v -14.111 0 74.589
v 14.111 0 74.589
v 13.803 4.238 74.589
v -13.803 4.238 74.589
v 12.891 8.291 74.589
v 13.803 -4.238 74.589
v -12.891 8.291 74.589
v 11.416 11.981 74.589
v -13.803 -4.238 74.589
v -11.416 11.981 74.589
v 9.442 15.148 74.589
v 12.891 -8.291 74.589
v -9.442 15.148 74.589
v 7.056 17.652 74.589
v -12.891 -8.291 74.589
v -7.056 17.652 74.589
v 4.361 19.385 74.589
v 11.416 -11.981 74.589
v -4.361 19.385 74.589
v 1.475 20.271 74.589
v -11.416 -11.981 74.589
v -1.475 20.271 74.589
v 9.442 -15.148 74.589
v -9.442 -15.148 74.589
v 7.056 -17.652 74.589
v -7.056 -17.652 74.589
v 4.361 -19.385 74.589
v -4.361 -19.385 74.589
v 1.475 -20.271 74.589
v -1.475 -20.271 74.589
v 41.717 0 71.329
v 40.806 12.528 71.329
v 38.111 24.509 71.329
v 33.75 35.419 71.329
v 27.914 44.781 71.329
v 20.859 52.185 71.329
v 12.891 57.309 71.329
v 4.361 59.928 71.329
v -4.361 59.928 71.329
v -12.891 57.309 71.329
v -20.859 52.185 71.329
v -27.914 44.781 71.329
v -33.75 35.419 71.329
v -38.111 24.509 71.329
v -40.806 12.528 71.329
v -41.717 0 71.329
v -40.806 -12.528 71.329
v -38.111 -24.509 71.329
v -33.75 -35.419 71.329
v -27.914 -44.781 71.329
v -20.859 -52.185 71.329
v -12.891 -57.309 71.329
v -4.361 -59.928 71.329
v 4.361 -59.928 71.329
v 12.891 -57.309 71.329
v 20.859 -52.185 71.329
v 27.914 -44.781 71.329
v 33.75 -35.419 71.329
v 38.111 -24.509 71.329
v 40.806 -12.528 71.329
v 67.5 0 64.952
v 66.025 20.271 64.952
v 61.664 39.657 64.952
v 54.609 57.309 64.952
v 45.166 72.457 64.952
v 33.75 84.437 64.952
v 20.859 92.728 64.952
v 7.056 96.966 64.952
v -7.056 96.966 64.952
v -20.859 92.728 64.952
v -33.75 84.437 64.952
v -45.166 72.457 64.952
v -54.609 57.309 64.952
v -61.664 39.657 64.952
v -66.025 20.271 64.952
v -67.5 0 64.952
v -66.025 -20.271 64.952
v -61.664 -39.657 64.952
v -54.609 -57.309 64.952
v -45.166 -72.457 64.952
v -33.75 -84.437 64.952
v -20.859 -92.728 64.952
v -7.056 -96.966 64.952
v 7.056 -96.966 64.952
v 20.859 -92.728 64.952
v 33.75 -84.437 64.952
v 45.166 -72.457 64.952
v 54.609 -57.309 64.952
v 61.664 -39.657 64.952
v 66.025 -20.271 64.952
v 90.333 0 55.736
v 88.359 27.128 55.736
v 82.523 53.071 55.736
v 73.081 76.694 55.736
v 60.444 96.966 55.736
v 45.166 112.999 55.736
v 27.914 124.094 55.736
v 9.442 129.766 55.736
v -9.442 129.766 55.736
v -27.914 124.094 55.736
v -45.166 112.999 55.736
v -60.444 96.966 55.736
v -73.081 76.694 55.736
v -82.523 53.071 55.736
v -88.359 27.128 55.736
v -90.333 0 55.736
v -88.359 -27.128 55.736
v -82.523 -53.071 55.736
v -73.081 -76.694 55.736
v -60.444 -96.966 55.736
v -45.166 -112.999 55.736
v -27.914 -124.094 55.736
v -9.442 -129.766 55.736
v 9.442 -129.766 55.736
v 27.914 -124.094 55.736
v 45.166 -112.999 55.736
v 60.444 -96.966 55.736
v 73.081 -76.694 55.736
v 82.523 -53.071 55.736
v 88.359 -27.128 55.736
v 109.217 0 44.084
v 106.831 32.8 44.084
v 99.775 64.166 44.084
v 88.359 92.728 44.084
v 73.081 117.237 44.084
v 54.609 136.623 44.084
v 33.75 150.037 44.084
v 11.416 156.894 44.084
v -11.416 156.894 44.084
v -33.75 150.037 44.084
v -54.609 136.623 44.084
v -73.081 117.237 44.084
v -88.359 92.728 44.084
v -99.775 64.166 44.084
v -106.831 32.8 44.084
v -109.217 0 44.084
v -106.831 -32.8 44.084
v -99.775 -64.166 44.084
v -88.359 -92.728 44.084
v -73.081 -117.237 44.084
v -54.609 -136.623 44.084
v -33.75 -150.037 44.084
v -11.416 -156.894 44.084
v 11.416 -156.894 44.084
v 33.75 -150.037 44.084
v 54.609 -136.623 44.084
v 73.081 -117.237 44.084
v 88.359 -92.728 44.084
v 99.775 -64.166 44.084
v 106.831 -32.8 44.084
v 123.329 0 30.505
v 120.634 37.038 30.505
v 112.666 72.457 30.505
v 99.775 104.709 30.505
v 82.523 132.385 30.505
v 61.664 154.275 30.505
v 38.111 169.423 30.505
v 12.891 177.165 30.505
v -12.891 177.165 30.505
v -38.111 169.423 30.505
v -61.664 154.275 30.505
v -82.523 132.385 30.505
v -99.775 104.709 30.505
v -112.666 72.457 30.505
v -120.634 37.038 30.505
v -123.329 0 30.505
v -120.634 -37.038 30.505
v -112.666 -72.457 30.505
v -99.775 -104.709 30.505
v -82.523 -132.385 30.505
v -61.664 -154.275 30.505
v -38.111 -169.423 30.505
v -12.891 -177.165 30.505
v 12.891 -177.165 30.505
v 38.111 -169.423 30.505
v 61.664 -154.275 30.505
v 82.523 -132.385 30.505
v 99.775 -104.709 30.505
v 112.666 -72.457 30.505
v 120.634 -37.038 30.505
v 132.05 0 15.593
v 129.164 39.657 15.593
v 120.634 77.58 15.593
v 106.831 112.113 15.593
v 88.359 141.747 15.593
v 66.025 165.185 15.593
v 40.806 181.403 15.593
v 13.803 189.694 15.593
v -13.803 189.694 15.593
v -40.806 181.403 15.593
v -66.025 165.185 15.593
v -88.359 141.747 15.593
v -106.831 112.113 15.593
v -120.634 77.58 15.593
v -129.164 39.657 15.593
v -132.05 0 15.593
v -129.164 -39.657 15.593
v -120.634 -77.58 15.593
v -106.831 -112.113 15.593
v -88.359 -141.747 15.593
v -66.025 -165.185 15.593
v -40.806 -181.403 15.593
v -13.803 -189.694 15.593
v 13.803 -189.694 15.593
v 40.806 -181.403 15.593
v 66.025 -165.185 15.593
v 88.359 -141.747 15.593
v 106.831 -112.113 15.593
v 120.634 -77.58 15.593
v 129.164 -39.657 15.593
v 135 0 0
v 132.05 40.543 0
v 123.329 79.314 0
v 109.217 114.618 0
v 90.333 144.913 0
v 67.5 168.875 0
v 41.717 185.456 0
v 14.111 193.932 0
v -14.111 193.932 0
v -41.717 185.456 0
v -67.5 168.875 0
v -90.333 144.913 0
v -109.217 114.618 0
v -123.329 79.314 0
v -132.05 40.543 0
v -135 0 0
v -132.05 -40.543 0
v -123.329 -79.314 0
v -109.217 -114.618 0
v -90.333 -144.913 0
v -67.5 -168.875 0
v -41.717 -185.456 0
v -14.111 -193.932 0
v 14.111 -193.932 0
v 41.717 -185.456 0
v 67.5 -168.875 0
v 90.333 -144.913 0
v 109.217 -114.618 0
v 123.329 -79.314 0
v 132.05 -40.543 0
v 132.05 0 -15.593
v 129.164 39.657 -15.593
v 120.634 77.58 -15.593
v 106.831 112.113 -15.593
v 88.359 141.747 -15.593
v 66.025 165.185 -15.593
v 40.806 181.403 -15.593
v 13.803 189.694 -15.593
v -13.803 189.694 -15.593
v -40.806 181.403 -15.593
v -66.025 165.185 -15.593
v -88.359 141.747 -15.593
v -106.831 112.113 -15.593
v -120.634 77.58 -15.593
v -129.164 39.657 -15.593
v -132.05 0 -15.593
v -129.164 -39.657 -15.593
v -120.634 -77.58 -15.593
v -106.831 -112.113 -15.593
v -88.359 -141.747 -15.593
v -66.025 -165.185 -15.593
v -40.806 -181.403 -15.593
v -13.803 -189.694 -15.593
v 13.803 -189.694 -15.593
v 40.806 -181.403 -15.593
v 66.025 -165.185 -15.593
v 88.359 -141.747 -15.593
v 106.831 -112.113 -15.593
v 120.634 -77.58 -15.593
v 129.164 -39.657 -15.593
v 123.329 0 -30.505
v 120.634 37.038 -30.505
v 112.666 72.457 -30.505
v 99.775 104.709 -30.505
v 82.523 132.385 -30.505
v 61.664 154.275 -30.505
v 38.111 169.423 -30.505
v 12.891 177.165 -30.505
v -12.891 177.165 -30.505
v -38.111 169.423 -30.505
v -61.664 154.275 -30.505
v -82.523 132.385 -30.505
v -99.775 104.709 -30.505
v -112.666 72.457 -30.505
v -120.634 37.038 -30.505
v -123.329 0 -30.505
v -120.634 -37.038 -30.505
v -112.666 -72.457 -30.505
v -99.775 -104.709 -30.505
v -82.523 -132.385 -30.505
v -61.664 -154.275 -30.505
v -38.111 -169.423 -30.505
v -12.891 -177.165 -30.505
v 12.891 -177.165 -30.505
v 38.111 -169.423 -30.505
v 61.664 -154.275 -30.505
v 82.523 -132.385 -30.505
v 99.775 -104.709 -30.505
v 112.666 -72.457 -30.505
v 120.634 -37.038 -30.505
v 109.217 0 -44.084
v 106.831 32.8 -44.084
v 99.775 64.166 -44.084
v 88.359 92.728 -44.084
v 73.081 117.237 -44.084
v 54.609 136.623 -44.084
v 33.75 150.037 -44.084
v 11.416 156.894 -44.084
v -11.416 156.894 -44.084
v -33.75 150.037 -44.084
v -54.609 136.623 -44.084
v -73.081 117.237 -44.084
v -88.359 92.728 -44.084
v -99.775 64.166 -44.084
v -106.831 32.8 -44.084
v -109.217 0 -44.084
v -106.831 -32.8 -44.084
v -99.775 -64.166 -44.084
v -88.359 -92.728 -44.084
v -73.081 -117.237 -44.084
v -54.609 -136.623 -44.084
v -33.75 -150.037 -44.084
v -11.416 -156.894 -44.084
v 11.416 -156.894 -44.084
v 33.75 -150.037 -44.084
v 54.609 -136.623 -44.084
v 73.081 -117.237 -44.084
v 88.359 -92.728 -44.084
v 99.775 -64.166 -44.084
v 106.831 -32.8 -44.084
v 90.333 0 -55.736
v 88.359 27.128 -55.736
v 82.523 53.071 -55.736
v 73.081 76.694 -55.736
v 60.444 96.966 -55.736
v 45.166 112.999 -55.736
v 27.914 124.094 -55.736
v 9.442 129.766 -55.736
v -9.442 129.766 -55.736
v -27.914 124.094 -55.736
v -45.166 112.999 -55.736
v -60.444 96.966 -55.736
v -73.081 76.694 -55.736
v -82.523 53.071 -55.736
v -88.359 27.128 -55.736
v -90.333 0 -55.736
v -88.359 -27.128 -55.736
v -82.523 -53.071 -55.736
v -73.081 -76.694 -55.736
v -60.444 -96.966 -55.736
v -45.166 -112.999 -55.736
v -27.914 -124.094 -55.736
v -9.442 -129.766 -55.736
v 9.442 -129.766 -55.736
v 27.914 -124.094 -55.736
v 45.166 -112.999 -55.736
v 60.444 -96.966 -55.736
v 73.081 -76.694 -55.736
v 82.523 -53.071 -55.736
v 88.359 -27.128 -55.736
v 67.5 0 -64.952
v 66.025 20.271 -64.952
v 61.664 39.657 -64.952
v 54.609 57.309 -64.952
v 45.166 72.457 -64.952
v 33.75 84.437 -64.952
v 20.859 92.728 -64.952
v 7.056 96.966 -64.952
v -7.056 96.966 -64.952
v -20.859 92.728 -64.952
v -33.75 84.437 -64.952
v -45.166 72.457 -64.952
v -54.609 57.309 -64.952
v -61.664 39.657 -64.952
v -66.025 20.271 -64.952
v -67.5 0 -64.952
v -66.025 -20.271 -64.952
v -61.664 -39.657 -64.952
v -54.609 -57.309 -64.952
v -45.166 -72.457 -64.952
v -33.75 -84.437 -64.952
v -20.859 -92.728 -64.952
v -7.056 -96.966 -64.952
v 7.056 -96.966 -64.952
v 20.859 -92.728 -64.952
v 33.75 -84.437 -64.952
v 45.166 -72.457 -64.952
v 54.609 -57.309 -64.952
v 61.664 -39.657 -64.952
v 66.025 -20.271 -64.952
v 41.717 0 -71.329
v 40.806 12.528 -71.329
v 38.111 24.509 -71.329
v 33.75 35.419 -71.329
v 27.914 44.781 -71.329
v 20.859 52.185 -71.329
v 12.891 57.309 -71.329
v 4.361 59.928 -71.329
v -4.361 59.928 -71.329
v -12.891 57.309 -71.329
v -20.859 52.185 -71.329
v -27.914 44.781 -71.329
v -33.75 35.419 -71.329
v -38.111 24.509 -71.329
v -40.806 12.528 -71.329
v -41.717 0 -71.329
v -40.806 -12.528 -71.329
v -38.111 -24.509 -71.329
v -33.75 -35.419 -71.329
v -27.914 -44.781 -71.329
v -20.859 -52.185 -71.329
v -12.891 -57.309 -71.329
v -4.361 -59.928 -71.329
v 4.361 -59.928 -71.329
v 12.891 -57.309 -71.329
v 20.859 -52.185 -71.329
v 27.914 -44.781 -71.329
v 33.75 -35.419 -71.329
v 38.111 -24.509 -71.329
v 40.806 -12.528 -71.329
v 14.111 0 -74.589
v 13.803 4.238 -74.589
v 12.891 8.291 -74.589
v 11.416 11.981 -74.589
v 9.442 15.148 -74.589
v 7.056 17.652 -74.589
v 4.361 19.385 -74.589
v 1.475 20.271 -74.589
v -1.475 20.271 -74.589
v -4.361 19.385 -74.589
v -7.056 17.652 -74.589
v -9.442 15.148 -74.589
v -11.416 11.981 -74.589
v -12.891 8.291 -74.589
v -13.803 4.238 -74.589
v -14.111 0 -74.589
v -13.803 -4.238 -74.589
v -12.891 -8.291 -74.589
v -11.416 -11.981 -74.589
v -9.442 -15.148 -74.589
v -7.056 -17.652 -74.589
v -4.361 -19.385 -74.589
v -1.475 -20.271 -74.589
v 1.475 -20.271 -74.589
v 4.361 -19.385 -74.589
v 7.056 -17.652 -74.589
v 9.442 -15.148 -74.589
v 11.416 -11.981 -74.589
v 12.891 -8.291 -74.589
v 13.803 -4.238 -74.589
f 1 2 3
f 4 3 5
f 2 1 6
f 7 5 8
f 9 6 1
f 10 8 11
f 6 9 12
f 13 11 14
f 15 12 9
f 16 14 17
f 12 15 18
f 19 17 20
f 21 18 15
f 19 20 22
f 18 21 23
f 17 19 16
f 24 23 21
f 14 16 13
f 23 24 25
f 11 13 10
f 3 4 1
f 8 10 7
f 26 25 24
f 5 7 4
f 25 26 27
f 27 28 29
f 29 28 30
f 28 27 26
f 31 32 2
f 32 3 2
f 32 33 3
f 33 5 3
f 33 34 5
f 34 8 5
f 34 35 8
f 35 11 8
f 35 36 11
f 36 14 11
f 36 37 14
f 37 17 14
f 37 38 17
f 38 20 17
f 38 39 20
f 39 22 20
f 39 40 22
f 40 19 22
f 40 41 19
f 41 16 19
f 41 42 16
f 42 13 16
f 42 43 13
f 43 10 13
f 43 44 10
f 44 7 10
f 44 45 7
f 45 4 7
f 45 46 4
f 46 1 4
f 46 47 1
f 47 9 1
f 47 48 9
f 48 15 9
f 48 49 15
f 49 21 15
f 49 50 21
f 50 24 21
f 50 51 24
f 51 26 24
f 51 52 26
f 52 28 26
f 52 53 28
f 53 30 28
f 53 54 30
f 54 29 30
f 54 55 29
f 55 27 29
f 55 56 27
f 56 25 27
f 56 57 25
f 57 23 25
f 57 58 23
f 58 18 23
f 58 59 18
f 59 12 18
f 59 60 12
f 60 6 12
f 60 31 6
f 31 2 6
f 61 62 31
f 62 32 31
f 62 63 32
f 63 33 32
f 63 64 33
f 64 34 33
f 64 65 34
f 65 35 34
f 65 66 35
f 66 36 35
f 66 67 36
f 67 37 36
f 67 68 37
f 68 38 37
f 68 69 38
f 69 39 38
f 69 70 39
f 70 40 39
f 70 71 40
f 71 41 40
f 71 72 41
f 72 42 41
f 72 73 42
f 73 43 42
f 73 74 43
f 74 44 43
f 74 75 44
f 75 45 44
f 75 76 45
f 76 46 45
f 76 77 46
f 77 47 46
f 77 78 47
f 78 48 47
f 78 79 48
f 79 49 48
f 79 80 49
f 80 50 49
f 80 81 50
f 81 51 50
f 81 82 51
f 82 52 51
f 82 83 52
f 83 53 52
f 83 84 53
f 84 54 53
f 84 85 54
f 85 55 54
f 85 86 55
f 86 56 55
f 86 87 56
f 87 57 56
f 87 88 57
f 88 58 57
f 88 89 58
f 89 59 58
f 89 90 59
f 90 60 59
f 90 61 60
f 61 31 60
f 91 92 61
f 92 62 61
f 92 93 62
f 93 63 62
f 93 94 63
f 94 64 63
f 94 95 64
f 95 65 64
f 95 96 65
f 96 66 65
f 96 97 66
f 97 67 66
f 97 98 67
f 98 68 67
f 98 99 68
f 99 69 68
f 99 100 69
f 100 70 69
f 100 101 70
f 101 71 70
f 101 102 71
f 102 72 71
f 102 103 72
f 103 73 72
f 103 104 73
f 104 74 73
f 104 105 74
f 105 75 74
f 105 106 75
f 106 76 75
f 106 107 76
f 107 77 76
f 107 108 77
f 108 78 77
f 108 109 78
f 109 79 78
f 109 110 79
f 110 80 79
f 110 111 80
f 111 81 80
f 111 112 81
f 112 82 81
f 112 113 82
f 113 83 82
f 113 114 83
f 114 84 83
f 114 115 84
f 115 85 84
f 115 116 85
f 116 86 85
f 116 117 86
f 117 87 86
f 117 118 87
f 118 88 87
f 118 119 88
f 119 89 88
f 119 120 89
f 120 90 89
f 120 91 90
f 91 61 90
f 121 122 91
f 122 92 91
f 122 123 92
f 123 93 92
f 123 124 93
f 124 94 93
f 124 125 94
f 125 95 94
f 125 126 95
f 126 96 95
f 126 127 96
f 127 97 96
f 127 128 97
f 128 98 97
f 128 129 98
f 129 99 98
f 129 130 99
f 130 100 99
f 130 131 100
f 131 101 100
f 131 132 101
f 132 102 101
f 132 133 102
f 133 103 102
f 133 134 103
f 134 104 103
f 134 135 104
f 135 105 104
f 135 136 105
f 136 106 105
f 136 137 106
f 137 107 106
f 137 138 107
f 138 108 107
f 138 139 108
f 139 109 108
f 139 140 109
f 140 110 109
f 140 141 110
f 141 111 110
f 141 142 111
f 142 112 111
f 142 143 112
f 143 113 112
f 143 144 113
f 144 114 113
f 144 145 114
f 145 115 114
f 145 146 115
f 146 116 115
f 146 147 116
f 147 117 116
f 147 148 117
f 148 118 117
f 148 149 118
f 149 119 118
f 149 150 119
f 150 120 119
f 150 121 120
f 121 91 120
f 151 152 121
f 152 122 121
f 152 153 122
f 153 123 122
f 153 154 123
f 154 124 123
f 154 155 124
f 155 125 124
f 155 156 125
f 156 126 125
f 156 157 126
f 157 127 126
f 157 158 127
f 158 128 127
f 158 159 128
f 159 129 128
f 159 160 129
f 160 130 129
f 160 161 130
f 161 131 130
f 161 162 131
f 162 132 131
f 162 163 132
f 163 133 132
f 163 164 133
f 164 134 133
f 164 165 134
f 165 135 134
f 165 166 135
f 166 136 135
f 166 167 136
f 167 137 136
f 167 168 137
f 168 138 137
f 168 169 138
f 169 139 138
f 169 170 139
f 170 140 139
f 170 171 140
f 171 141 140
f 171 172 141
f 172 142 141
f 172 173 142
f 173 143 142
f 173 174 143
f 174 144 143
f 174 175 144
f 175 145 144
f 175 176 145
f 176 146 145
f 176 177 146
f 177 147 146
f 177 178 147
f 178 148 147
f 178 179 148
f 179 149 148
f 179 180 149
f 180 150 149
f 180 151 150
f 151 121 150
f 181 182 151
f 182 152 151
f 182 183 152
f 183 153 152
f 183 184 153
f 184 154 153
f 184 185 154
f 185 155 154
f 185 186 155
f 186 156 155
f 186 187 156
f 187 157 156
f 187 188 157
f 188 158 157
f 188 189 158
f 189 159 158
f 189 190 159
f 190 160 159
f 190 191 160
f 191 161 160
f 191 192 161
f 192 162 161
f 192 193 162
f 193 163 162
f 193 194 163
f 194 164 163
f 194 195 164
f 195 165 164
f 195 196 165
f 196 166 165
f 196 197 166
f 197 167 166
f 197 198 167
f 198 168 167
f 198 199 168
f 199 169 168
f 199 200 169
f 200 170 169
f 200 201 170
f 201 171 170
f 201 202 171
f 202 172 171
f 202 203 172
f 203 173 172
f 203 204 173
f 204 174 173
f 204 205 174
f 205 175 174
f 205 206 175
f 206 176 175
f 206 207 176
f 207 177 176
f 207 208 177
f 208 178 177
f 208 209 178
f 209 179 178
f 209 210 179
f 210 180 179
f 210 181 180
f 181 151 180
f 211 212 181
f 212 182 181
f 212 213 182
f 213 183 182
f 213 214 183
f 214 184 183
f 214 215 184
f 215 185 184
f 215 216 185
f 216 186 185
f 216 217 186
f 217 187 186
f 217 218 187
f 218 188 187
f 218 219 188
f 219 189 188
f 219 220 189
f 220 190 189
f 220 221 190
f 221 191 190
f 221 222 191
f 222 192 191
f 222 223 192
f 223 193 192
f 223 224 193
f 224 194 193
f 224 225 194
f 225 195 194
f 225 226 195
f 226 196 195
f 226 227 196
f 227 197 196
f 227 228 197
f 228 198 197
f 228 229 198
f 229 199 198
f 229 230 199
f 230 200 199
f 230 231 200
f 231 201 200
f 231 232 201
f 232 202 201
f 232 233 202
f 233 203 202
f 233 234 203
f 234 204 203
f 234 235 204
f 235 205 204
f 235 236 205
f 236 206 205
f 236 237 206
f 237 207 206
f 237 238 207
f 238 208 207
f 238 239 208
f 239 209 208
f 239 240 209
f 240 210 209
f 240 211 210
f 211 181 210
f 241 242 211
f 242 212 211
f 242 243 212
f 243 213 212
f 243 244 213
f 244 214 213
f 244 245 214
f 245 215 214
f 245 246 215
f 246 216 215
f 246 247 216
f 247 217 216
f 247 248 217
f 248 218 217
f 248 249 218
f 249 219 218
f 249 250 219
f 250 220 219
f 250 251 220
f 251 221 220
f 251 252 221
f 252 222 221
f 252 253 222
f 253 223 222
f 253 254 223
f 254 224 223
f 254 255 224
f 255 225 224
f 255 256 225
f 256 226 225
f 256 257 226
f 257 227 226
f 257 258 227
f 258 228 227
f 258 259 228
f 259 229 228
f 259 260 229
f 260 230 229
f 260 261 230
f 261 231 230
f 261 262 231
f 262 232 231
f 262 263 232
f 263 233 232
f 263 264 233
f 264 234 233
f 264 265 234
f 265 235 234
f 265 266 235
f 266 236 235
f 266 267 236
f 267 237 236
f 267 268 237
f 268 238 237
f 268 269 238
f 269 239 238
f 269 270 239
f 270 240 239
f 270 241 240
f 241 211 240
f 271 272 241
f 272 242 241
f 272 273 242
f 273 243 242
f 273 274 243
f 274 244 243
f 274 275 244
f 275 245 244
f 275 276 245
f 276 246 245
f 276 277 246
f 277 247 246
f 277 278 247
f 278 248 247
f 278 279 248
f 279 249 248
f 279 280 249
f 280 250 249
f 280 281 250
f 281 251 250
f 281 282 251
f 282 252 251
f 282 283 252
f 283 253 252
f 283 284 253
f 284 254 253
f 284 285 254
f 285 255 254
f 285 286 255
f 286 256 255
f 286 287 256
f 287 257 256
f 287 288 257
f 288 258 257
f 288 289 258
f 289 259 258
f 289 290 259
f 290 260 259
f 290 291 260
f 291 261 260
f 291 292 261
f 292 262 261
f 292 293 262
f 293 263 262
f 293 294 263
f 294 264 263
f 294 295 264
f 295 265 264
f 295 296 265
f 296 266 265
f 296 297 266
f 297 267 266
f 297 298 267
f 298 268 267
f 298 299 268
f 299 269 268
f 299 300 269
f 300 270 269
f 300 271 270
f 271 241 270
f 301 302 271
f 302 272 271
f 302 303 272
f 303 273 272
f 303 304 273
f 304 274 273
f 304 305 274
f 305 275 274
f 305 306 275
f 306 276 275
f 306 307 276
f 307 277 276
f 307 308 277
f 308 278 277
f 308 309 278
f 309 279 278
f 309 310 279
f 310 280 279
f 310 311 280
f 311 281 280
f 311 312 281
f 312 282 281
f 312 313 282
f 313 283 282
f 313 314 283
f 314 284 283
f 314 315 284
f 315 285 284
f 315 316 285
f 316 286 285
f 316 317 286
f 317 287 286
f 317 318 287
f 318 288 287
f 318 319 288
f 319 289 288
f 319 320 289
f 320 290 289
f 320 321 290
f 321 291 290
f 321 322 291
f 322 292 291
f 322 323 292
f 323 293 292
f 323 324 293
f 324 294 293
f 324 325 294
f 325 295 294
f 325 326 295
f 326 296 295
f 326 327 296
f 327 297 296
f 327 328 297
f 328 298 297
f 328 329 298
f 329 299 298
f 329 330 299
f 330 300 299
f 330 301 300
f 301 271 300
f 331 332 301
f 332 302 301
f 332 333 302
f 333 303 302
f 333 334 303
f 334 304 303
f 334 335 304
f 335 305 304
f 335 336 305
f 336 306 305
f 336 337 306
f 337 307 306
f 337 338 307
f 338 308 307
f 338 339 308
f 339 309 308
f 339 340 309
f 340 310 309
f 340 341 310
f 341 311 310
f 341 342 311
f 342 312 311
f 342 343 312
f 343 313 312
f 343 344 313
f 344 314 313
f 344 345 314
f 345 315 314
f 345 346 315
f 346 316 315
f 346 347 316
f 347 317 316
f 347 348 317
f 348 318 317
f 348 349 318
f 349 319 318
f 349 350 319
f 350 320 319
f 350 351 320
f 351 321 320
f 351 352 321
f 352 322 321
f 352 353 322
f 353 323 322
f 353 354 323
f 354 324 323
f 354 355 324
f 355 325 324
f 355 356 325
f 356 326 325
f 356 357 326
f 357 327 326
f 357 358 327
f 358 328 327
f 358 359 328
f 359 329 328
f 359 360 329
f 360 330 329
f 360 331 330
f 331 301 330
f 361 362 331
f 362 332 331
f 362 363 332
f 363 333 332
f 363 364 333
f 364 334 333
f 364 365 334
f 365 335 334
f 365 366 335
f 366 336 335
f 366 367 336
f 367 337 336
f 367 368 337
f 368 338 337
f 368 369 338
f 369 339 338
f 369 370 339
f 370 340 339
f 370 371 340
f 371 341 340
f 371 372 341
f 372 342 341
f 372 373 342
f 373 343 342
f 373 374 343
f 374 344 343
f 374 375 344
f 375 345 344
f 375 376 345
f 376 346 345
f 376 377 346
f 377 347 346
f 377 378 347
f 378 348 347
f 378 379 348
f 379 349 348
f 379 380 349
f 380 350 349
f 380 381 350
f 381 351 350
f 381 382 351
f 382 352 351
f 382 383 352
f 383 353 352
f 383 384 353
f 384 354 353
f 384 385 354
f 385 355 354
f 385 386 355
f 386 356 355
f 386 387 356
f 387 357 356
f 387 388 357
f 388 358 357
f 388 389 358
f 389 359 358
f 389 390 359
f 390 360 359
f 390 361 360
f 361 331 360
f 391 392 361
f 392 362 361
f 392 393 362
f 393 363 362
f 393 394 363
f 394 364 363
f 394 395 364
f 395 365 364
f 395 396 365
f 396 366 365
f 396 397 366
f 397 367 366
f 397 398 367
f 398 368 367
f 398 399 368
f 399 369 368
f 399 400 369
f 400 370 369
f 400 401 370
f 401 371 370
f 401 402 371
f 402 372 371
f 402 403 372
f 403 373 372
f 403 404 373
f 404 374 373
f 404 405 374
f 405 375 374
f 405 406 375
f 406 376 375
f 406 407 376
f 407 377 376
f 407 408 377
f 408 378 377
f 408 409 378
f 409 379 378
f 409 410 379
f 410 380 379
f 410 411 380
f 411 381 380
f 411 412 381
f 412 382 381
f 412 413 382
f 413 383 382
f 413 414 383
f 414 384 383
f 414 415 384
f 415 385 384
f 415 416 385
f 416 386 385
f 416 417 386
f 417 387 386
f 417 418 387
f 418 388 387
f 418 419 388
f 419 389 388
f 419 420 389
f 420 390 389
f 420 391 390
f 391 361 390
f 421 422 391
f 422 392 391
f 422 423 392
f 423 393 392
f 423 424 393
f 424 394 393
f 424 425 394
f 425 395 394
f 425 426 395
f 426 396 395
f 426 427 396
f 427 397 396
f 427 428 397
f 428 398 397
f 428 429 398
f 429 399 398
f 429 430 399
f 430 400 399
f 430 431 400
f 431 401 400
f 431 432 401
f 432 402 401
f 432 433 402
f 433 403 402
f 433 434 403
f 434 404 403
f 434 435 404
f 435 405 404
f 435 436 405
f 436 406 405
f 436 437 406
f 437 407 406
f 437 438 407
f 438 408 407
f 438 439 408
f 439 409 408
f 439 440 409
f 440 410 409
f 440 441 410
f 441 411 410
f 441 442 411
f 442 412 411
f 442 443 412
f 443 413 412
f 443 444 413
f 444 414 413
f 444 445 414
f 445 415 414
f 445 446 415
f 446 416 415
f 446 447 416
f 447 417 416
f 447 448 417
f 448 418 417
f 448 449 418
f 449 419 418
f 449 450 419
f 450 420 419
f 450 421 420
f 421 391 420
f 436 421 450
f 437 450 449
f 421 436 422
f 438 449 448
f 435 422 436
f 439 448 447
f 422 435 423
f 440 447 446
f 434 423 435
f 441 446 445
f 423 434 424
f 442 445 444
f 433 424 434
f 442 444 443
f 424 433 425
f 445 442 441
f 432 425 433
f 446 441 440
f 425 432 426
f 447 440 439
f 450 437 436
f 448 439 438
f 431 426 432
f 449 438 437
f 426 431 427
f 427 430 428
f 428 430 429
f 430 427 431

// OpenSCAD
// Generated by SolidPython 1.0.1 on 2020-07-29 00:46:48


scale(v = [9, 13, 5]) {
	sphere(r = 15);
}
/***********************************************
*********      SolidPython code:      **********
************************************************
 
# import packages: SolidPython
from solid import *
from solid.utils import *
from itertools import chain, combinations, permutations


class Resize:

    def __init__(self, scad_file):
        self.scad_file = scad_file
        #self.scad_file = import_scad(scad_file)
        # cone/cylinder param:
        self.r1 = 0
        self.r2 = 0
        self.h = 0
        # rectangular prism param:
        self.w = 0
        self.l = 0
        # ellipse param:
        self.r = 0

    # import OpenScad code (file name corresponds to shape)


    # classify shape + parameters
    def assign(self, param1, param2, param3):
        if self.scad_file == 'cone.scad':
            self.r1 = param1
            self.r2 = param2
            self.h = param3
        elif self.scad_file == 'cylinder.scad':
            self.r1 = param1
            self.r2 = param2
            self.h = param3
        elif self.scad_file == 'rectangularPrism.scad':
            self.h = param1
            self.l = param2
            self.w = param3
        else:
            self.r = param1
            self.h = param2

    # resize parameters
    def iterate(self):
        x = range(3, 20, 2)
        i = 1
        if self.scad_file == 'cone.scad':
            tempList = list(permutations(x, 2))
            for temp in tempList:
                param1 = temp[0]
                param2 = temp[1]
                filepath = 'produced_scad_files/' + 'cone' + str(param1) + '_' + str(param2) + '_' + '.scad'
                scad_render_to_file(cylinder(h=param1, r1=param2, r2=0), filepath)

        elif self.scad_file == 'cylinder.scad':
            tempList = list(permutations(x, 3))
            for temp in tempList:
                param1 = temp[0]
                param2 = temp[1]
                filepath = 'produced_scad_files/' + 'cylinder' + str(param1) + '_' + str(param2) + '_' + '.scad'
                scad_render_to_file(cylinder(h=param1, r1=param2, r2=param2), filepath)

        elif self.scad_file == 'rectangularPrism.scad':
            tempList = list(permutations(x, 3))
            for temp in tempList:
                param1 = temp[0]
                param2 = temp[1]
                param3 = temp[2]
                filepath = 'produced_scad_files/' + 'rectangularPrism' + str(param1) + '_' + str(param2) + '_' + str(
                    param3) + '.scad'
                scad_render_to_file(cube(size=(param1, param2, param3)), filepath)

        elif self.scad_file == 'ellipse.scad':
            tempList = list(permutations(x, 4))
            for temp in tempList:
                param1 = temp[0]
                param2 = temp[1]
                param3 = temp[2]
                param4 = temp[3]
                filepath = 'produced_scad_files/' + 'ellipse' + str(param1) + '_' + str(param2) + '_' + str(param3) + '_' + str(param4) + '.scad'
                scad_render_to_file(scale([param1, param2, param3])(sphere(r=param4)), filepath)

    def render_to_scadfile(self):
        scad_render_to_file(scad, 'example.scad') 
 
************************************************/
